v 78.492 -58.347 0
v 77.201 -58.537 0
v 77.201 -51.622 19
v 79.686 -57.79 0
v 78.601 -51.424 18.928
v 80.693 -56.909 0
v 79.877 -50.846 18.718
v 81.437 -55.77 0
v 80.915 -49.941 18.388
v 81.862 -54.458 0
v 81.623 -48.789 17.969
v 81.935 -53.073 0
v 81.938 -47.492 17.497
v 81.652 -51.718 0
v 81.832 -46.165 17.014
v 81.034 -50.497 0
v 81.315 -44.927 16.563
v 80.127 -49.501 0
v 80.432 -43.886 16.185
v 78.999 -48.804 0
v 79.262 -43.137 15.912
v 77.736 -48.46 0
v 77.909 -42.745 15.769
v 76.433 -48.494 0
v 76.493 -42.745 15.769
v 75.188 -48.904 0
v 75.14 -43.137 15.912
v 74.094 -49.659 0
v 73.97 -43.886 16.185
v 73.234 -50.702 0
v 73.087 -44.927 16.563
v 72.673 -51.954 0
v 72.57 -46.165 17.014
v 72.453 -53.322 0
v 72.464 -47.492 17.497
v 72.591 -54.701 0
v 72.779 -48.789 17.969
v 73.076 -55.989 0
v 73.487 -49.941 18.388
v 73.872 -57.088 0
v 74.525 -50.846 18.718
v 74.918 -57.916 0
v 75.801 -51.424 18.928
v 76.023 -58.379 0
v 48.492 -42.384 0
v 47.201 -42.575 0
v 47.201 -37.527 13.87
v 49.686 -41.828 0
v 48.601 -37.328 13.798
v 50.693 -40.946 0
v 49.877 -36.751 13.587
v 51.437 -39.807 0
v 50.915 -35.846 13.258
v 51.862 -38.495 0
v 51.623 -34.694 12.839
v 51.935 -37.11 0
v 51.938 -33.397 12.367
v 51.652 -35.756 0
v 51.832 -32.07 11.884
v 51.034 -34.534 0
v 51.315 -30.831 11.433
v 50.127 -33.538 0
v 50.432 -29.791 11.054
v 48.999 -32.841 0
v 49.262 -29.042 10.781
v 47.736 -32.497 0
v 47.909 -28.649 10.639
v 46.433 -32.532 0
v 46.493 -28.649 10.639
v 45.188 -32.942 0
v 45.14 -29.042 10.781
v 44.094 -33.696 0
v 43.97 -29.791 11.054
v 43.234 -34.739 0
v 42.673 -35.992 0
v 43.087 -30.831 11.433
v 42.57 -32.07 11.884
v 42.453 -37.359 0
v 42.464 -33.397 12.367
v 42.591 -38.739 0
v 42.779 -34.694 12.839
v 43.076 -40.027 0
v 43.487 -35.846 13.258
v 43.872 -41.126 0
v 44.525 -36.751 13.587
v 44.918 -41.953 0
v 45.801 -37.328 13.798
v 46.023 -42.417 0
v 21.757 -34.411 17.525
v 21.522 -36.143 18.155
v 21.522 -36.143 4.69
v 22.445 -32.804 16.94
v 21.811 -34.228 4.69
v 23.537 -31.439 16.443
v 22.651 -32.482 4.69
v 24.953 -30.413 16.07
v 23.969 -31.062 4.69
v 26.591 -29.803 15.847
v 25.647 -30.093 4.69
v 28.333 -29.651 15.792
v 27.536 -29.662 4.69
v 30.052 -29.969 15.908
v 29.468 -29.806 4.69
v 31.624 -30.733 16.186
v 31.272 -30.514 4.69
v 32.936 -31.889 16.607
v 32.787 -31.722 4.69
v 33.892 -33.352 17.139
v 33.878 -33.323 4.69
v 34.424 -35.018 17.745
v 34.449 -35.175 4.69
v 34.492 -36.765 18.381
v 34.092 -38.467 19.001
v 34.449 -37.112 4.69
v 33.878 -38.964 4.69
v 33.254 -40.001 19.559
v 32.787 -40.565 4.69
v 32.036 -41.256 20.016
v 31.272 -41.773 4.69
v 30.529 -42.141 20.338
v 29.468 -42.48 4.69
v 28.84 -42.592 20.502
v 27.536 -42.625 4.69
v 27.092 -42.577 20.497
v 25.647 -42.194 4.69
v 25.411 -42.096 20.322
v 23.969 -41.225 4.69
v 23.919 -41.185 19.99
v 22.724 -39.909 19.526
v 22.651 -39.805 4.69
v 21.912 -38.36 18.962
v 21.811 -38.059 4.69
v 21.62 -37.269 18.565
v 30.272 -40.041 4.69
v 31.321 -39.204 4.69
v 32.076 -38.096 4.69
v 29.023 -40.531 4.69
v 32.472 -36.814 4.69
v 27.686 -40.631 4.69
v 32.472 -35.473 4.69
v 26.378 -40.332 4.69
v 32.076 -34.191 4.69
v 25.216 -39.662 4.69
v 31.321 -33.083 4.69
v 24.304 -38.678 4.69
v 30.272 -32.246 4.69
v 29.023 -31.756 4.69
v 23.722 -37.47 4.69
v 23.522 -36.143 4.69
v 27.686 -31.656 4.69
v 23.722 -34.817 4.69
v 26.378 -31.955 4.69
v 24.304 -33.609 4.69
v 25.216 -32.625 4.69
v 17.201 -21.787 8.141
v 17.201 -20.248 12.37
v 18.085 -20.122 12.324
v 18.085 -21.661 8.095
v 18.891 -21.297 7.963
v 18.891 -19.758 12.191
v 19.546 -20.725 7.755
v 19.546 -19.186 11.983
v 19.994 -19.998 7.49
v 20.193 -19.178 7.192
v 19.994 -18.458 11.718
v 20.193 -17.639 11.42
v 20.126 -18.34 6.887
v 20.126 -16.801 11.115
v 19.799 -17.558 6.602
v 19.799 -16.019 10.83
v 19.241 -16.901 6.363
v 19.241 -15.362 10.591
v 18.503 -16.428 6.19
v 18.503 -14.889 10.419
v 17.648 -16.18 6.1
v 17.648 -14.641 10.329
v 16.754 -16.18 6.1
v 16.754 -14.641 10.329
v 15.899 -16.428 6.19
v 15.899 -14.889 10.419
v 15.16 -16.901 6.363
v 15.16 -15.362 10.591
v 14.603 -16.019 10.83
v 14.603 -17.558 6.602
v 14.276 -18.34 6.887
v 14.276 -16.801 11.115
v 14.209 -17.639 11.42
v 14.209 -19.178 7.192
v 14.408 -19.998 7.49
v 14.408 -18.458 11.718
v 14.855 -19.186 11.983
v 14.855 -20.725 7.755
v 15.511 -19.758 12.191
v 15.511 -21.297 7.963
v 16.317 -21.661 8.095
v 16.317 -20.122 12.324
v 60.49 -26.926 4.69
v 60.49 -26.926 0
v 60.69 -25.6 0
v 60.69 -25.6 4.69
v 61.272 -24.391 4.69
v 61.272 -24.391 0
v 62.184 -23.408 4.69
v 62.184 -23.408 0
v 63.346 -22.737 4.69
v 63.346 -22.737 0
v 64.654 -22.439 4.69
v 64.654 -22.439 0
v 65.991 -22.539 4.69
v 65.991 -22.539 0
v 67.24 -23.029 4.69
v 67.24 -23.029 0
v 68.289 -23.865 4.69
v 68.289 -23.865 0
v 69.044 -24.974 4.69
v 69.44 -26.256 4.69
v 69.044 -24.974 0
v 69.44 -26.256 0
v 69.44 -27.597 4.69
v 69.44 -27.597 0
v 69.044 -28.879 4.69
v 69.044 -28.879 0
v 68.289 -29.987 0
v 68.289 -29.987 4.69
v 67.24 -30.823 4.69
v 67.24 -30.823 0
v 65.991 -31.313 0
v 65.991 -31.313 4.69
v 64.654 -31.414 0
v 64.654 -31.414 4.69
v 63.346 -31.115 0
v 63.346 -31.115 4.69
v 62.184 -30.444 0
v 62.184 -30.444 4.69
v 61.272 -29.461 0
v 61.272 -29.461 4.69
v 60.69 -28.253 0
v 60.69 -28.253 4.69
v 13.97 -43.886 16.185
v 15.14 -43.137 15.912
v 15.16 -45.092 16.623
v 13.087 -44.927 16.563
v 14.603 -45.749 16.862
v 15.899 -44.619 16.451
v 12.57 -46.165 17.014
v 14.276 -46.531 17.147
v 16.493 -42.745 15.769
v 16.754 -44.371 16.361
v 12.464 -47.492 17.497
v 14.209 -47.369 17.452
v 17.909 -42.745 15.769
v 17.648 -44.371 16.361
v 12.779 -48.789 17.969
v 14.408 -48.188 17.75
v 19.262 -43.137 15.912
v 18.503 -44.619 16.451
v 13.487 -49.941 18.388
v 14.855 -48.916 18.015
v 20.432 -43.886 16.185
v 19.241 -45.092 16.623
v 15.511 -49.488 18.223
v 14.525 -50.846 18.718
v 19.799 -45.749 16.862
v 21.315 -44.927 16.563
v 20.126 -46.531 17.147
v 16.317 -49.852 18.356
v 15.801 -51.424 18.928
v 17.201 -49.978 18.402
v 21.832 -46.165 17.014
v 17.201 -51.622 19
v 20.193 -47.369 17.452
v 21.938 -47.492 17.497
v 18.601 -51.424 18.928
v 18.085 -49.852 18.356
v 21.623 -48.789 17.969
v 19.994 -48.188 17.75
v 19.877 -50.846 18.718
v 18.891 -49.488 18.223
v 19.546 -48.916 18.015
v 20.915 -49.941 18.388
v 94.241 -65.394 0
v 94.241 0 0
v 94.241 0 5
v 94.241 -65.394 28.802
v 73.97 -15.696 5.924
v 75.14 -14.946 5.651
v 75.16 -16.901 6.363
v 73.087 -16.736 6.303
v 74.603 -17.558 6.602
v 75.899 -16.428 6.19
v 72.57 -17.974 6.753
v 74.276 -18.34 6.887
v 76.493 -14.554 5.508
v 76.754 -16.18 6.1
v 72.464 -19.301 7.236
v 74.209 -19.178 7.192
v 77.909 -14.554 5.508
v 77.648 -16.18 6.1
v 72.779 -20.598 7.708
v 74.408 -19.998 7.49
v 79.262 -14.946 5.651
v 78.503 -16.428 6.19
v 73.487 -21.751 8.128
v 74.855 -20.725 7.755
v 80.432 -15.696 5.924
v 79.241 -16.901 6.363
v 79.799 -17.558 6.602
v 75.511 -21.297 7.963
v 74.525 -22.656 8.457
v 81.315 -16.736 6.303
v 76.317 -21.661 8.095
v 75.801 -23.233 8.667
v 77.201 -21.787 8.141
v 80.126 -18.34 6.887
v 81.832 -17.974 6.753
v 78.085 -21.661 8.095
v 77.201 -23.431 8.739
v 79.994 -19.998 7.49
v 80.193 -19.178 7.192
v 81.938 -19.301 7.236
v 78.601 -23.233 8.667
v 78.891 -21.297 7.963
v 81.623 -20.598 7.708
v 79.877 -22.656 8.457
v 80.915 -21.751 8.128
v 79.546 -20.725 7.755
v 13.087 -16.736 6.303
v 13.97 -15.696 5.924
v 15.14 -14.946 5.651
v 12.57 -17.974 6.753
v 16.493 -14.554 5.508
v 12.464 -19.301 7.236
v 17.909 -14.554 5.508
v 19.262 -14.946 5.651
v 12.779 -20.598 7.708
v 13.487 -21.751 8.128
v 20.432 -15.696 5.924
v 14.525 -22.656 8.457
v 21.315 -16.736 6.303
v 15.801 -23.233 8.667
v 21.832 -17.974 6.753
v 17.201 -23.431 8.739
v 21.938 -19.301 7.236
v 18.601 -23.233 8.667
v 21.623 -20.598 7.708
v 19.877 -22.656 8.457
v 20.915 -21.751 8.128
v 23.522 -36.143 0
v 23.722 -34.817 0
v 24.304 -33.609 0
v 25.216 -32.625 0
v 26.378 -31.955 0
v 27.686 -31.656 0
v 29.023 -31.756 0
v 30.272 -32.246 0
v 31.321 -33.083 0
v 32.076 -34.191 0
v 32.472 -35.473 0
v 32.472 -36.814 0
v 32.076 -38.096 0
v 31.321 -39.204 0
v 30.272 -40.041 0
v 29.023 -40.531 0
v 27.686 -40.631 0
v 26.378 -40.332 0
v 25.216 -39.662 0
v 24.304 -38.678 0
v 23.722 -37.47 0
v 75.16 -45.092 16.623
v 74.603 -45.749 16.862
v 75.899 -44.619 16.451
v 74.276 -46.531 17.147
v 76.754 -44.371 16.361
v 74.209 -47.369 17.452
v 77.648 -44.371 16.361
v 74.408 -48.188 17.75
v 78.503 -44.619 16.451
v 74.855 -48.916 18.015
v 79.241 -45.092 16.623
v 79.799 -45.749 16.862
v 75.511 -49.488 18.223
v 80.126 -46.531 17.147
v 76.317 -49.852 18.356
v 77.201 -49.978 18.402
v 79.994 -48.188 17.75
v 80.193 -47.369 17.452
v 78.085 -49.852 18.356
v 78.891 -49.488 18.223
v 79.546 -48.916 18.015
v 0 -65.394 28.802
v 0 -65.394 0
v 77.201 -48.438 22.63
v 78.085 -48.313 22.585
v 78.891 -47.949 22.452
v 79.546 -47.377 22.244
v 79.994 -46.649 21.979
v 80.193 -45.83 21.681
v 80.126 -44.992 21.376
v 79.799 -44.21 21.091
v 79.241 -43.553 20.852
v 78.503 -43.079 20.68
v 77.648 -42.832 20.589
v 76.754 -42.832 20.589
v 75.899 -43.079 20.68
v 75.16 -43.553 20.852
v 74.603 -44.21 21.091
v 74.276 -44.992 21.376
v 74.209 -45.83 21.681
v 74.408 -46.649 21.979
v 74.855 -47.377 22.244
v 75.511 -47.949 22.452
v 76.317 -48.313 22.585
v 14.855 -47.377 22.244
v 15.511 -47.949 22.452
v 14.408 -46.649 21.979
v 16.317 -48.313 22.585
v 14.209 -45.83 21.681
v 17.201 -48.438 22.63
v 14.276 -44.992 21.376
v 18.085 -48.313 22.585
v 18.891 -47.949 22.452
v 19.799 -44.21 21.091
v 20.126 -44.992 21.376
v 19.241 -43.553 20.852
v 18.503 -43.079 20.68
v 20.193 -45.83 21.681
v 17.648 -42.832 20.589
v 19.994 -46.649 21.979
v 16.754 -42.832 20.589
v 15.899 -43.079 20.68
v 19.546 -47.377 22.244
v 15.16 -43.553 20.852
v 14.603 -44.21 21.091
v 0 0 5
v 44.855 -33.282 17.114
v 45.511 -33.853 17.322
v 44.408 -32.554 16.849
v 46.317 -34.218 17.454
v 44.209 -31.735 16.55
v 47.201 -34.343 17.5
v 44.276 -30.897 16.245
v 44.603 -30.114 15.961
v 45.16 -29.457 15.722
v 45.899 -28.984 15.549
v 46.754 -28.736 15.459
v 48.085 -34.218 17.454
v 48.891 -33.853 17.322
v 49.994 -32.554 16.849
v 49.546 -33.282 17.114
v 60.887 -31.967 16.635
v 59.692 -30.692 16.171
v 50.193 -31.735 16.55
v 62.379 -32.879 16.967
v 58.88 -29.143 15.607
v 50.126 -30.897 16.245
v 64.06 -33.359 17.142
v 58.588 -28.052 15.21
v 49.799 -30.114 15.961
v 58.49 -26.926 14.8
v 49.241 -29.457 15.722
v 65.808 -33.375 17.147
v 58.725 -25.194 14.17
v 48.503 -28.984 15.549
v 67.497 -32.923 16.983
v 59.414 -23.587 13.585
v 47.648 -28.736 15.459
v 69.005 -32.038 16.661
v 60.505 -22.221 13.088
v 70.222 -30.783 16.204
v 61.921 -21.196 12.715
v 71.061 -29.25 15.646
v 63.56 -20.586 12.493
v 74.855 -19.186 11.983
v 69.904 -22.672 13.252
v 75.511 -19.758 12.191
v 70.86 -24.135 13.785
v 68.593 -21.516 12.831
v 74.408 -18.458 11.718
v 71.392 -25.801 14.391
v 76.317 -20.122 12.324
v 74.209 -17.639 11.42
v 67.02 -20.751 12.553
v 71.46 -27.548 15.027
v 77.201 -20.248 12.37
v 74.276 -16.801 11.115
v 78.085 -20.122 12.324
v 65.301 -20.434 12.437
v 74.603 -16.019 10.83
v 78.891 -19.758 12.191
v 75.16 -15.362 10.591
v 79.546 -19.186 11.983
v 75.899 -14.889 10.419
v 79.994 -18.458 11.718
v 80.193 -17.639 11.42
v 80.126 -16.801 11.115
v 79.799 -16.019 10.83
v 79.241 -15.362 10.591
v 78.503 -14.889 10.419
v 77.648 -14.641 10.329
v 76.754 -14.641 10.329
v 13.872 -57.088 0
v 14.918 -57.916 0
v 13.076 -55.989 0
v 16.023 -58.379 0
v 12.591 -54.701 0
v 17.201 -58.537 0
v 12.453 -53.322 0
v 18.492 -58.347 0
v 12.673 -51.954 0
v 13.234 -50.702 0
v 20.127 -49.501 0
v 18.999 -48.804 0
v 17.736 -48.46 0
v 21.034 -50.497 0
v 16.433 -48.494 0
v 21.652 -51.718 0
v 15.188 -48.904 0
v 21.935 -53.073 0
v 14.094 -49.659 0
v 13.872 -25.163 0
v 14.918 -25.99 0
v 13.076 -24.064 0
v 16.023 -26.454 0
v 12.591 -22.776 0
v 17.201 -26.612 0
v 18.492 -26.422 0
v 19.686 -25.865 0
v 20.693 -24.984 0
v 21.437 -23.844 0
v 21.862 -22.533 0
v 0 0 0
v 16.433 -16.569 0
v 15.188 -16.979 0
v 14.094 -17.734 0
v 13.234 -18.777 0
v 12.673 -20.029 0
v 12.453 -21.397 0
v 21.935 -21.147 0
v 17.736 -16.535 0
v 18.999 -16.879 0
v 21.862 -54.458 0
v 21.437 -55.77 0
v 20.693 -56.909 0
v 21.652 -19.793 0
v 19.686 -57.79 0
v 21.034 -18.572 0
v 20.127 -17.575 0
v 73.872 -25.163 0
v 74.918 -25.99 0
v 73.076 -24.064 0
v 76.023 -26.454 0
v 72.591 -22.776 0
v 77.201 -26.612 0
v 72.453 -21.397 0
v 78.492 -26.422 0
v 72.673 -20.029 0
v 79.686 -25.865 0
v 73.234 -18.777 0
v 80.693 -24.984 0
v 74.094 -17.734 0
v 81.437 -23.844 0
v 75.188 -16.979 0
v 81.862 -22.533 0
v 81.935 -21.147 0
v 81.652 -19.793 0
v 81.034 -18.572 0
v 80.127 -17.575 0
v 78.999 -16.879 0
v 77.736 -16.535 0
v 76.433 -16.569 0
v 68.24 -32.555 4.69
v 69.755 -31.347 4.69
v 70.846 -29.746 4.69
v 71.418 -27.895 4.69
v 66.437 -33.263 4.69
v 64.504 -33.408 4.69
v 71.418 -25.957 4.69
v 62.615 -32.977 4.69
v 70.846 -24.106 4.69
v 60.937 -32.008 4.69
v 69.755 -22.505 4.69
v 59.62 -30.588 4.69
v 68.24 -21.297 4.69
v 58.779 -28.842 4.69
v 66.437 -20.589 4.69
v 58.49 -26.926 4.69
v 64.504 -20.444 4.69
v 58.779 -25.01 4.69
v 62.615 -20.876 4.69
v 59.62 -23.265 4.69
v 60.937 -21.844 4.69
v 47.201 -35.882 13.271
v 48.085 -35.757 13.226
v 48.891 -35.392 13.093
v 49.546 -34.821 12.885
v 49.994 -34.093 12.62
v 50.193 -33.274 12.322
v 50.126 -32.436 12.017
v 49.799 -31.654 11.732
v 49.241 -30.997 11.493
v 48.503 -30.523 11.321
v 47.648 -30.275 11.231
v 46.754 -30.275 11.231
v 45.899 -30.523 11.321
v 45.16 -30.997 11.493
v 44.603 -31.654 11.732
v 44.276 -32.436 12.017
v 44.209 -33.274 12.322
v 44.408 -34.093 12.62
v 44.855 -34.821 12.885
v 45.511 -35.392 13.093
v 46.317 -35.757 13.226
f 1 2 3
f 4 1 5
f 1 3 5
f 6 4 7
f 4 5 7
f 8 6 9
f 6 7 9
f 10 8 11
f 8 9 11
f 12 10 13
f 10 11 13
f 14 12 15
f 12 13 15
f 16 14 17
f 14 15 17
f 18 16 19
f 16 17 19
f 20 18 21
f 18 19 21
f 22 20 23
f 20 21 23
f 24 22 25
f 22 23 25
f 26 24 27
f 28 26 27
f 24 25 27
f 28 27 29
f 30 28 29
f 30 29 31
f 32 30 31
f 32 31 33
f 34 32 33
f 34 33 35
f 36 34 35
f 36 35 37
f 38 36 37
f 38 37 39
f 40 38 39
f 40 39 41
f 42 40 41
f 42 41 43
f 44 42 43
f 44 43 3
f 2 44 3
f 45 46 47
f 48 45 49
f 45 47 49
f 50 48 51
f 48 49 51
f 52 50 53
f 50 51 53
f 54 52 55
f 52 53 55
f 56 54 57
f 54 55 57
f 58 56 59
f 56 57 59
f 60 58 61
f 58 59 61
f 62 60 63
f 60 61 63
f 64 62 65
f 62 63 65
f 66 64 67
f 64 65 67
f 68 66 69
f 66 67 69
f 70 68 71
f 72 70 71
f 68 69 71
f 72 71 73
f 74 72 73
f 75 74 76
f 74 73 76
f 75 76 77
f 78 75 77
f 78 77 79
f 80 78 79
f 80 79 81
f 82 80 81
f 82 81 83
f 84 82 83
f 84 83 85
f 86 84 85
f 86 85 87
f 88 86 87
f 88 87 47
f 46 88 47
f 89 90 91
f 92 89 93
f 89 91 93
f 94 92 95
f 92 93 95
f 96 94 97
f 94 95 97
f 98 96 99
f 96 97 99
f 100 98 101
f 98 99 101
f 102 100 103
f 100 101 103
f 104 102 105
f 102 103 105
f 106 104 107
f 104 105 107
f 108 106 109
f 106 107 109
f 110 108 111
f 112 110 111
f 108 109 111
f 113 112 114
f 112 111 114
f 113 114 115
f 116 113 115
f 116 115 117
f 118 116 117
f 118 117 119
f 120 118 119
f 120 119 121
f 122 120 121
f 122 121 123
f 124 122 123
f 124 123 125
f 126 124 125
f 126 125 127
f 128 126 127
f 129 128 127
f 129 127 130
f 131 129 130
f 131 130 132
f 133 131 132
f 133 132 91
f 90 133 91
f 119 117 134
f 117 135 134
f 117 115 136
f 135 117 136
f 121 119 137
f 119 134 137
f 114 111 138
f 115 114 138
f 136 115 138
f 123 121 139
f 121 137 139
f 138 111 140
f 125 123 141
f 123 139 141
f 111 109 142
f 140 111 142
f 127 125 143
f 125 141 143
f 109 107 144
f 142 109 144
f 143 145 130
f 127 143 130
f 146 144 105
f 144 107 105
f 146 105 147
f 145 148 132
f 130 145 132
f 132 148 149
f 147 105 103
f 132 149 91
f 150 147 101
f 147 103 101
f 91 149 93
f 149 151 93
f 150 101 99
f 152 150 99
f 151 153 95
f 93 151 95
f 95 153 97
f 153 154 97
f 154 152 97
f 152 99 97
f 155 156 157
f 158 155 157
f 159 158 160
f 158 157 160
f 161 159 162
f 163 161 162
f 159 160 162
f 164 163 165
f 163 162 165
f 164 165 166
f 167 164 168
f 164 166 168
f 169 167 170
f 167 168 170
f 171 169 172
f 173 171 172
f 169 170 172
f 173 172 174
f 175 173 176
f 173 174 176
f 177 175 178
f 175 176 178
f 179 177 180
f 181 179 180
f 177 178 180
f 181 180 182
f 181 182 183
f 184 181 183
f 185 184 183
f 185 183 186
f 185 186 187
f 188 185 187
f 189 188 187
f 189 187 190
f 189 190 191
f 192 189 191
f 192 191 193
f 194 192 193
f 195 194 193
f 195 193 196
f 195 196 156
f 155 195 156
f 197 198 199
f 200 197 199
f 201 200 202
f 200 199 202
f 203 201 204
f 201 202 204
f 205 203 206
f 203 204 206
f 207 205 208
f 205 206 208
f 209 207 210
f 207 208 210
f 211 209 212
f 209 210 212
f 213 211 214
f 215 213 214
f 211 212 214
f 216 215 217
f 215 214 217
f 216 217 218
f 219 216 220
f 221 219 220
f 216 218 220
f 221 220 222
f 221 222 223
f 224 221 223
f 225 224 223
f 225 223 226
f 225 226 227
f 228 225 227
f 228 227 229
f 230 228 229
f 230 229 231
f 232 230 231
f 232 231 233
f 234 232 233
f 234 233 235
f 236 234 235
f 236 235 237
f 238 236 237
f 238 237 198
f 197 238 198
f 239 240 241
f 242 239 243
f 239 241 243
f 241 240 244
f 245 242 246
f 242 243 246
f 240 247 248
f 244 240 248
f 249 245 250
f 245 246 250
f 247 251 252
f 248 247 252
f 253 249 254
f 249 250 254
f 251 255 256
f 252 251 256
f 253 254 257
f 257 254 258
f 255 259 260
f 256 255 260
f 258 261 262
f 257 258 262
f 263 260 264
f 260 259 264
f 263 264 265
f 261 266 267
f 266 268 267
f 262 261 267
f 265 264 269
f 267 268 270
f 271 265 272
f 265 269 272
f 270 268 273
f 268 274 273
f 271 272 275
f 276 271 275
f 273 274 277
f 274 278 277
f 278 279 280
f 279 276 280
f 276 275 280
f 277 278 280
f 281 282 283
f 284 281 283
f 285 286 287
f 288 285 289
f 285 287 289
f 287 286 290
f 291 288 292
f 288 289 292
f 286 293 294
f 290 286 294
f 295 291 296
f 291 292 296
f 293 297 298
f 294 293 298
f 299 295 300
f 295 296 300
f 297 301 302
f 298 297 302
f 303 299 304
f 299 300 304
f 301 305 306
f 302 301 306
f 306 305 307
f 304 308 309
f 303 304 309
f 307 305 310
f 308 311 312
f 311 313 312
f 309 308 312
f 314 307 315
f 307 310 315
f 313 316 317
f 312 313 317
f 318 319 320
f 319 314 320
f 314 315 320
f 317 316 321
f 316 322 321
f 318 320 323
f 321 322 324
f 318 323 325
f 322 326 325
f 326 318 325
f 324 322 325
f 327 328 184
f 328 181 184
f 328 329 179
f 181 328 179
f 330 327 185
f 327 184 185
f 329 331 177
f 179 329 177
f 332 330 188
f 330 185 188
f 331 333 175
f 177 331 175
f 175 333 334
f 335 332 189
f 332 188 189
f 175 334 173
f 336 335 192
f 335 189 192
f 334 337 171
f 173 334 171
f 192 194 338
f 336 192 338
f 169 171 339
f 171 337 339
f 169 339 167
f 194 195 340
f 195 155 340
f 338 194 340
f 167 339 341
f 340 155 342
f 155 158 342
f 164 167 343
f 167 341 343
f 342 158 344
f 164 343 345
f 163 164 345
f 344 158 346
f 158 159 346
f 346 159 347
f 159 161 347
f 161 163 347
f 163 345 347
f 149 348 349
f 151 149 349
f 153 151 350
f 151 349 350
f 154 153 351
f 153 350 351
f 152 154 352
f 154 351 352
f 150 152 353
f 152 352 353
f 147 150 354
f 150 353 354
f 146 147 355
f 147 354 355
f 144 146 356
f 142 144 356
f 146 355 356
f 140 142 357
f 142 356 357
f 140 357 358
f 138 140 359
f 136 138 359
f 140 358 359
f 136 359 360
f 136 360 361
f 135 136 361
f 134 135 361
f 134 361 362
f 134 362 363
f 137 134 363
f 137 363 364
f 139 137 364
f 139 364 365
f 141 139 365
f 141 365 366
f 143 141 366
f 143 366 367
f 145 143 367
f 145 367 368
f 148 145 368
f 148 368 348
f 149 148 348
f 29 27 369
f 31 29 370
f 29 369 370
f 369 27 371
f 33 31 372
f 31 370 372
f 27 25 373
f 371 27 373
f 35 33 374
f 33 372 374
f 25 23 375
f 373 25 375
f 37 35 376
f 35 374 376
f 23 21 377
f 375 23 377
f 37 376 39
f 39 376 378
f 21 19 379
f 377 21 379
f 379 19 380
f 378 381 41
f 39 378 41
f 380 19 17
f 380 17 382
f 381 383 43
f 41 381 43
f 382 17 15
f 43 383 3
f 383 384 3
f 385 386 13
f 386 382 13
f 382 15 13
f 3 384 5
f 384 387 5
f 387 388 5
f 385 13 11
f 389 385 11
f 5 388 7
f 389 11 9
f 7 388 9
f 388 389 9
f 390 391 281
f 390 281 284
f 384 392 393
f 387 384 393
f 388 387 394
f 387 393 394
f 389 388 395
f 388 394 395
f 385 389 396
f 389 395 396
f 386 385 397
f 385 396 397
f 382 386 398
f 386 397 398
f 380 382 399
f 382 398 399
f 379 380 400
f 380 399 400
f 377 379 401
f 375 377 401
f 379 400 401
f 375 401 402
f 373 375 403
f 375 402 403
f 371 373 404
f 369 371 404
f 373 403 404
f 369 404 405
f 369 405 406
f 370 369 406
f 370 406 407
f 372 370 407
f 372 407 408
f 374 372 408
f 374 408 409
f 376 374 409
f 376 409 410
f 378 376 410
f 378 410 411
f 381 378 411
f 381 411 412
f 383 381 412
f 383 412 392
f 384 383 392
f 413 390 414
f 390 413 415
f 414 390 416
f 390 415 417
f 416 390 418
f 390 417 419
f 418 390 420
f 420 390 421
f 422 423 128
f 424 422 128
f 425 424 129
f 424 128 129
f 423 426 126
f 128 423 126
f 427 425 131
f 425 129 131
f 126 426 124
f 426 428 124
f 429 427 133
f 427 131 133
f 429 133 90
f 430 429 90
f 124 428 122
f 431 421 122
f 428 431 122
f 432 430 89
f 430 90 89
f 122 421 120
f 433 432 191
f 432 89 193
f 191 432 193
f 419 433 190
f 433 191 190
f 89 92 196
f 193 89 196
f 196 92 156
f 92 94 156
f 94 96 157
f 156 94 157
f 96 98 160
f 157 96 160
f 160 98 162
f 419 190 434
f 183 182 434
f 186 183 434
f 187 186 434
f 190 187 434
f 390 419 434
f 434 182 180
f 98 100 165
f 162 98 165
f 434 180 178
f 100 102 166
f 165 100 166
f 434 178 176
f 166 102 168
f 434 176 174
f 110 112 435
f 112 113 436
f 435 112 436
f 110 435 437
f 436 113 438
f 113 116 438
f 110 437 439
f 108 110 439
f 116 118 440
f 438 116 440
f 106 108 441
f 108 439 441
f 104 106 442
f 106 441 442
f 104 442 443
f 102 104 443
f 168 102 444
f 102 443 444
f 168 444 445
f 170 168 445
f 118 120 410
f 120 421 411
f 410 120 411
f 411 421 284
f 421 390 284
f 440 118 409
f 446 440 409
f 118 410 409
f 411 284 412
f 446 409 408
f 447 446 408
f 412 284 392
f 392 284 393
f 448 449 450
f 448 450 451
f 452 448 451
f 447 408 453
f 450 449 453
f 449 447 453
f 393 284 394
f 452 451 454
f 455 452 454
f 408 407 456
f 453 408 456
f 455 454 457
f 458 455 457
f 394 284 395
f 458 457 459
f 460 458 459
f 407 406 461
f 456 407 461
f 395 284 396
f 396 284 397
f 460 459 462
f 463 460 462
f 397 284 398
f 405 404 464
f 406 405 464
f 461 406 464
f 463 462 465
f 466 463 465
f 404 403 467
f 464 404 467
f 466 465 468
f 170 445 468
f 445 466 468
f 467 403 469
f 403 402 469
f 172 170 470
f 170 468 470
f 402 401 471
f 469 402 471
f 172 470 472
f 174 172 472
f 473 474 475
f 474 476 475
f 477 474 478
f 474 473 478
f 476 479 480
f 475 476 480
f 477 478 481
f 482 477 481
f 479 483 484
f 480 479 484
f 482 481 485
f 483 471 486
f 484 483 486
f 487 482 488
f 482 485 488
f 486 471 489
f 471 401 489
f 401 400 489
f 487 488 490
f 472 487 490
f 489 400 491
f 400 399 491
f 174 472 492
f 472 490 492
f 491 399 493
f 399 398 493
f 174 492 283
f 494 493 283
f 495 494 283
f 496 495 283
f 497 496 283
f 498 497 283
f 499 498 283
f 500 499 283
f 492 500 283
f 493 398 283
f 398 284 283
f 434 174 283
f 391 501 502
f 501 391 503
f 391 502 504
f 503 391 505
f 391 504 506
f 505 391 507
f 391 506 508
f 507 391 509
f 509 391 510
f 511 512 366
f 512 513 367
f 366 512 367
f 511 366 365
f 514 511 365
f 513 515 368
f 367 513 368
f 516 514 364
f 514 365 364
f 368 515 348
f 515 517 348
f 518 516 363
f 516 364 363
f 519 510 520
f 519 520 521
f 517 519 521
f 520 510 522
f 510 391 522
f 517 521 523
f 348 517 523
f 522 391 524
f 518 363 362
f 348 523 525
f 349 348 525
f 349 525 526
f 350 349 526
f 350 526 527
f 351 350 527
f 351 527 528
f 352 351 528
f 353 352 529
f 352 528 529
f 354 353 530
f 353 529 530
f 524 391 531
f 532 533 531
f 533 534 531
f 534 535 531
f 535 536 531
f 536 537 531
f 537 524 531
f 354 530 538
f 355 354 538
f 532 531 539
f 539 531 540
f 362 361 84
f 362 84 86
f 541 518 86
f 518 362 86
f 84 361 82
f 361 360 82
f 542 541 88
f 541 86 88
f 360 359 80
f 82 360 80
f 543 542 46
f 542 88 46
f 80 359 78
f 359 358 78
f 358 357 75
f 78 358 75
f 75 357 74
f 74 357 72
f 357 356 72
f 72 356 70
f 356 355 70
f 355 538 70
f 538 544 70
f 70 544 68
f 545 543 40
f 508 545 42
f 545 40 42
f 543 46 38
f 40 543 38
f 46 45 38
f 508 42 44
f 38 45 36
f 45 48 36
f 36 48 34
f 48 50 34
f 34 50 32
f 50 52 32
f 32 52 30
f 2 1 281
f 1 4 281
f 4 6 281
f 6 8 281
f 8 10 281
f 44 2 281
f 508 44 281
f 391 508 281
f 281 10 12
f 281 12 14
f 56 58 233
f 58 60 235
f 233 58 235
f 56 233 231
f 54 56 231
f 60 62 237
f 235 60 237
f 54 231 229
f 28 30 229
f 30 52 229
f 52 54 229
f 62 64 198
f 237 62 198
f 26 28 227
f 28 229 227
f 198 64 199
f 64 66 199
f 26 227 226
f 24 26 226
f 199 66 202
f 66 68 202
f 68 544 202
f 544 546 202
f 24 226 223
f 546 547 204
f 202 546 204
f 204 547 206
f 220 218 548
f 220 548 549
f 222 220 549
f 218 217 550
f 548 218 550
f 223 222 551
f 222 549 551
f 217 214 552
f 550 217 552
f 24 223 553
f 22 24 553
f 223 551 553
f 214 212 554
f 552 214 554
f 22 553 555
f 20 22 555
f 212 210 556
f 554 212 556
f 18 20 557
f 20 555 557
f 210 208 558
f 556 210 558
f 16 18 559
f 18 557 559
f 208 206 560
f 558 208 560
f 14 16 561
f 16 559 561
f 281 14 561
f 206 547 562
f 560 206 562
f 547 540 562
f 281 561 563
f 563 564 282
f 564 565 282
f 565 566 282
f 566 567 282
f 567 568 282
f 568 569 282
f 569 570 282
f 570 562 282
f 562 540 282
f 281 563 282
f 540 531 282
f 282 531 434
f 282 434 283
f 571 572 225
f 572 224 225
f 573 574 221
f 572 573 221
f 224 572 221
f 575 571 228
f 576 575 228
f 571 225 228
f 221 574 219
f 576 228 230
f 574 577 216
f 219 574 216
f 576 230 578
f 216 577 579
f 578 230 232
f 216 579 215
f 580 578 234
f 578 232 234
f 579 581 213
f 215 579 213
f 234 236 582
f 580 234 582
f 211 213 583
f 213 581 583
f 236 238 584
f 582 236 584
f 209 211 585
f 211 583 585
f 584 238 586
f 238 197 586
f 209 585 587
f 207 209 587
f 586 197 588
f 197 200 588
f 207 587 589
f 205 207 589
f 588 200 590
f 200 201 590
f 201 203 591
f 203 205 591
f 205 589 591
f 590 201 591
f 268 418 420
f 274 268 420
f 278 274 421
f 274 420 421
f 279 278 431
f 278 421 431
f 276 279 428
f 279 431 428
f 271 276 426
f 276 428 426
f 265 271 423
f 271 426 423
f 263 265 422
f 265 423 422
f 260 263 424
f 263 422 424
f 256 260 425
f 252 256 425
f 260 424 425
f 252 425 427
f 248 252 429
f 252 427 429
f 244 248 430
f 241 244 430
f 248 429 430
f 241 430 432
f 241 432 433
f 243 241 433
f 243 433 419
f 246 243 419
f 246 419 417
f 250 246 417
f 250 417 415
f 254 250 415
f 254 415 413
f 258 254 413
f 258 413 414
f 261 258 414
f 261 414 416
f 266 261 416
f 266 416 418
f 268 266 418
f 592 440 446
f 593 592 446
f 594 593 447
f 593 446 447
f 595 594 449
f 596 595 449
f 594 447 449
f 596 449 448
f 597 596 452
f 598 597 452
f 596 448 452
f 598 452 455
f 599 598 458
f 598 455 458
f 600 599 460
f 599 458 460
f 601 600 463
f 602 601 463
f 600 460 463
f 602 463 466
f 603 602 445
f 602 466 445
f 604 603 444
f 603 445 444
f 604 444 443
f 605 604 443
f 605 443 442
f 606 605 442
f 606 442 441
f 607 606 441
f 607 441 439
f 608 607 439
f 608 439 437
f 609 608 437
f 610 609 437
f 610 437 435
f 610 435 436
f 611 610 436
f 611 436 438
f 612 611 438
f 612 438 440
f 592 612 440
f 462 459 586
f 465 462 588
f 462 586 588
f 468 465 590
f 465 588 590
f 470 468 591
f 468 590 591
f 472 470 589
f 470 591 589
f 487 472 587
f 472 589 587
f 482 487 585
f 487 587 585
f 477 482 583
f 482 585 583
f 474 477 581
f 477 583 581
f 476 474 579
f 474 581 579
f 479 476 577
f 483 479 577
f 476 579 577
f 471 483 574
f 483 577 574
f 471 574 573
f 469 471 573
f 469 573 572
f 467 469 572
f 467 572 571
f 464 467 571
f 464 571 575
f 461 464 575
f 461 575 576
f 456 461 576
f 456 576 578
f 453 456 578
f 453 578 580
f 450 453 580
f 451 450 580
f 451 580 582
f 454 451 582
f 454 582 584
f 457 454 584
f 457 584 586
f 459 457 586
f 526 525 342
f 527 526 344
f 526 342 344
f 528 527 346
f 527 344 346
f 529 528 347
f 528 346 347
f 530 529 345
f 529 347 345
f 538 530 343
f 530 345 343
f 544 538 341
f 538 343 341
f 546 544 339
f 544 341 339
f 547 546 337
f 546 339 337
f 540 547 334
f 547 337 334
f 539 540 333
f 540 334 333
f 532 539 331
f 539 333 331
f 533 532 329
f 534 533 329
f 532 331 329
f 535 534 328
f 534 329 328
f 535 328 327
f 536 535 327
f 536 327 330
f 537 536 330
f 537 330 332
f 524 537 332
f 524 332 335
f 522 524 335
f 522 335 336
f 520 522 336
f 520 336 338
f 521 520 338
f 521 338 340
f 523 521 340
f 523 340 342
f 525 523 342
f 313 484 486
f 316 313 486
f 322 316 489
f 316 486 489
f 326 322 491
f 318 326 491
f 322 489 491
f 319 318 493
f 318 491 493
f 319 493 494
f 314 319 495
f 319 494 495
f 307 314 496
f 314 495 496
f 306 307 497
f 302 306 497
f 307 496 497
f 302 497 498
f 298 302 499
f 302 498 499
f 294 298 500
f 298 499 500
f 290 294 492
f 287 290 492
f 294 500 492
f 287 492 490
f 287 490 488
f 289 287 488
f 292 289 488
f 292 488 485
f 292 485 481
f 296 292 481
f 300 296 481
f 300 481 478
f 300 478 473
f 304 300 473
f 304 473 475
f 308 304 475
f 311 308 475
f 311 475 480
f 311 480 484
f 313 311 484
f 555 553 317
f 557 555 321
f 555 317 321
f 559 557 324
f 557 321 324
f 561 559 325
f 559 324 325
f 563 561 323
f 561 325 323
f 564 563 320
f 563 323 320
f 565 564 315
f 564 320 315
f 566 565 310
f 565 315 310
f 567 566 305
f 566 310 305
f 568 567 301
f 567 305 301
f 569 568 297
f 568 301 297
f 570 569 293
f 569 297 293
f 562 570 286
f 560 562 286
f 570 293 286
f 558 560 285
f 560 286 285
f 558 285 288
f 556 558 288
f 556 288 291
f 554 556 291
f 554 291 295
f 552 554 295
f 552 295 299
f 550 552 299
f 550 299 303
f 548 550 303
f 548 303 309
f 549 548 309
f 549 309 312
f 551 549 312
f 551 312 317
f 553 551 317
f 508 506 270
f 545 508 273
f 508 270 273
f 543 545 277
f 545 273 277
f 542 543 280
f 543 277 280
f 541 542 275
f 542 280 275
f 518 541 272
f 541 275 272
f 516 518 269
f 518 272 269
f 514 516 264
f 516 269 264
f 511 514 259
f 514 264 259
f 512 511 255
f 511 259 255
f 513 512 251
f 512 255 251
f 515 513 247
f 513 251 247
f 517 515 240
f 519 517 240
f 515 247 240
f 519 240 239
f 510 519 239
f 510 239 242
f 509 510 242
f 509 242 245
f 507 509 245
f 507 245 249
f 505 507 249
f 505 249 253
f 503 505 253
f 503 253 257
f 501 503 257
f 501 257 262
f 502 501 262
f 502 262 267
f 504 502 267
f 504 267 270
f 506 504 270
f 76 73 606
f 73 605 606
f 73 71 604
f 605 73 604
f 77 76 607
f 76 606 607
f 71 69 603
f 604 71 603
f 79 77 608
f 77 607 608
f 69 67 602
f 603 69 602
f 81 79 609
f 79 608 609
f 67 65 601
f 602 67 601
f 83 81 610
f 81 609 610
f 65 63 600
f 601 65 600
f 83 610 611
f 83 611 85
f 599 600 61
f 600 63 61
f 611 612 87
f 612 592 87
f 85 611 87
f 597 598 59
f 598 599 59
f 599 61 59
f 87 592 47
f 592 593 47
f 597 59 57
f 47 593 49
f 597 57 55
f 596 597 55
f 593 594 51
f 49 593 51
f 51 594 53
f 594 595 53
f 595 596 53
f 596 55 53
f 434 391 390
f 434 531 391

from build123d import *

# Parameters (mm, degrees)
SKETCH1_W           = 94.24092637
SKETCH1_H           = 65.39427142
BOSS_EXTRUDE1_DEPTH = 5
BOSS_EXTRUDE2_DEPTH = 94.24092637
SKETCH4_R           = 4.5
CUT_EXTRUDE1_DEPTH  = 94.24092637
CUT_EXTRUDE2_START  = -4.69
SKETCH4_4_R         = 6.5
CUT_EXTRUDE2_DEPTH  = 94.24092637
SKETCH3_R           = 3
CUT_EXTRUDE3_DEPTH  = 94.24092637
CUT_EXTRUDE4_START  = -4.5
SKETCH3_3_R         = 4.75
CUT_EXTRUDE4_DEPTH  = 94.24092637


with BuildPart() as part:
    # Sketch1 → Boss-Extrude1 (new body)
    with BuildSketch(Plane.XY):
        with Locations((47.120463185, -32.69713571)):
            Rectangle(SKETCH1_W, SKETCH1_H)
    extrude(amount=BOSS_EXTRUDE1_DEPTH)

    # Sketch2 → Boss-Extrude2 (add)
    with BuildSketch(Plane(origin=(94.24092637, 0, 0), x_dir=(0, 0, -1), z_dir=(1, 0, 0))):
        Polygon((-5, -65.39427142), (-28.80156829, -65.39427142), (-5, 0), align=None)
    extrude(amount=-BOSS_EXTRUDE2_DEPTH)

    # Sketch4 → Cut-Extrude1 (cut)
    with BuildSketch(Plane(origin=(0, 0, 0), x_dir=(-1, 0, 0), z_dir=(0, 0, -1))):
        with Locations((-64.990115154, -26.926235979)):
            Circle(SKETCH4_R)
        with Locations((-28.021847985, -36.1434602)):
            Circle(SKETCH4_R)
    extrude(amount=-CUT_EXTRUDE1_DEPTH, mode=Mode.SUBTRACT)

    # Sketch4<4> → Cut-Extrude2 (cut)
    with BuildSketch(Plane(origin=(0, 0, 0), x_dir=(-1, 0, 0), z_dir=(0, 0, -1)).offset(CUT_EXTRUDE2_START)):
        with Locations((-64.990115154, -26.926235979)):
            Circle(SKETCH4_4_R)
        with Locations((-28.021847985, -36.1434602)):
            Circle(SKETCH4_4_R)
    extrude(amount=-CUT_EXTRUDE2_DEPTH, mode=Mode.SUBTRACT)

    # Sketch3 → Cut-Extrude3 (cut)
    with BuildSketch(Plane(origin=(0, 1.606969024, 4.415111108), x_dir=(1, 0, 0), z_dir=(0, 0.34202014334590697, 0.9396926207785422))):
        with Locations((47.20092637, -35.257197457)):
            Circle(SKETCH3_R)
        with Locations((17.20092637, -50.257197457)):
            Circle(SKETCH3_R)
        with Locations((17.20092637, -20.257197457)):
            Circle(SKETCH3_R)
        with Locations((77.20092637, -20.257197457)):
            Circle(SKETCH3_R)
        with Locations((77.20092637, -50.257197457)):
            Circle(SKETCH3_R)
    extrude(amount=-CUT_EXTRUDE3_DEPTH, mode=Mode.SUBTRACT)

    # Sketch3<3> → Cut-Extrude4 (cut)
    with BuildSketch(Plane(origin=(0, 1.606969024, 4.415111108), x_dir=(1, 0, 0), z_dir=(0, 0.34202014334590697, 0.9396926207785422)).offset(CUT_EXTRUDE4_START)):
        with Locations((17.20092637, -20.257197457)):
            Circle(SKETCH3_3_R)
        with Locations((17.20092637, -50.257197457)):
            Circle(SKETCH3_3_R)
        with Locations((47.20092637, -35.257197457)):
            Circle(SKETCH3_3_R)
        with Locations((77.20092637, -20.257197457)):
            Circle(SKETCH3_3_R)
        with Locations((77.20092637, -50.257197457)):
            Circle(SKETCH3_3_R)
    extrude(amount=-CUT_EXTRUDE4_DEPTH, mode=Mode.SUBTRACT)


solid = part.part
